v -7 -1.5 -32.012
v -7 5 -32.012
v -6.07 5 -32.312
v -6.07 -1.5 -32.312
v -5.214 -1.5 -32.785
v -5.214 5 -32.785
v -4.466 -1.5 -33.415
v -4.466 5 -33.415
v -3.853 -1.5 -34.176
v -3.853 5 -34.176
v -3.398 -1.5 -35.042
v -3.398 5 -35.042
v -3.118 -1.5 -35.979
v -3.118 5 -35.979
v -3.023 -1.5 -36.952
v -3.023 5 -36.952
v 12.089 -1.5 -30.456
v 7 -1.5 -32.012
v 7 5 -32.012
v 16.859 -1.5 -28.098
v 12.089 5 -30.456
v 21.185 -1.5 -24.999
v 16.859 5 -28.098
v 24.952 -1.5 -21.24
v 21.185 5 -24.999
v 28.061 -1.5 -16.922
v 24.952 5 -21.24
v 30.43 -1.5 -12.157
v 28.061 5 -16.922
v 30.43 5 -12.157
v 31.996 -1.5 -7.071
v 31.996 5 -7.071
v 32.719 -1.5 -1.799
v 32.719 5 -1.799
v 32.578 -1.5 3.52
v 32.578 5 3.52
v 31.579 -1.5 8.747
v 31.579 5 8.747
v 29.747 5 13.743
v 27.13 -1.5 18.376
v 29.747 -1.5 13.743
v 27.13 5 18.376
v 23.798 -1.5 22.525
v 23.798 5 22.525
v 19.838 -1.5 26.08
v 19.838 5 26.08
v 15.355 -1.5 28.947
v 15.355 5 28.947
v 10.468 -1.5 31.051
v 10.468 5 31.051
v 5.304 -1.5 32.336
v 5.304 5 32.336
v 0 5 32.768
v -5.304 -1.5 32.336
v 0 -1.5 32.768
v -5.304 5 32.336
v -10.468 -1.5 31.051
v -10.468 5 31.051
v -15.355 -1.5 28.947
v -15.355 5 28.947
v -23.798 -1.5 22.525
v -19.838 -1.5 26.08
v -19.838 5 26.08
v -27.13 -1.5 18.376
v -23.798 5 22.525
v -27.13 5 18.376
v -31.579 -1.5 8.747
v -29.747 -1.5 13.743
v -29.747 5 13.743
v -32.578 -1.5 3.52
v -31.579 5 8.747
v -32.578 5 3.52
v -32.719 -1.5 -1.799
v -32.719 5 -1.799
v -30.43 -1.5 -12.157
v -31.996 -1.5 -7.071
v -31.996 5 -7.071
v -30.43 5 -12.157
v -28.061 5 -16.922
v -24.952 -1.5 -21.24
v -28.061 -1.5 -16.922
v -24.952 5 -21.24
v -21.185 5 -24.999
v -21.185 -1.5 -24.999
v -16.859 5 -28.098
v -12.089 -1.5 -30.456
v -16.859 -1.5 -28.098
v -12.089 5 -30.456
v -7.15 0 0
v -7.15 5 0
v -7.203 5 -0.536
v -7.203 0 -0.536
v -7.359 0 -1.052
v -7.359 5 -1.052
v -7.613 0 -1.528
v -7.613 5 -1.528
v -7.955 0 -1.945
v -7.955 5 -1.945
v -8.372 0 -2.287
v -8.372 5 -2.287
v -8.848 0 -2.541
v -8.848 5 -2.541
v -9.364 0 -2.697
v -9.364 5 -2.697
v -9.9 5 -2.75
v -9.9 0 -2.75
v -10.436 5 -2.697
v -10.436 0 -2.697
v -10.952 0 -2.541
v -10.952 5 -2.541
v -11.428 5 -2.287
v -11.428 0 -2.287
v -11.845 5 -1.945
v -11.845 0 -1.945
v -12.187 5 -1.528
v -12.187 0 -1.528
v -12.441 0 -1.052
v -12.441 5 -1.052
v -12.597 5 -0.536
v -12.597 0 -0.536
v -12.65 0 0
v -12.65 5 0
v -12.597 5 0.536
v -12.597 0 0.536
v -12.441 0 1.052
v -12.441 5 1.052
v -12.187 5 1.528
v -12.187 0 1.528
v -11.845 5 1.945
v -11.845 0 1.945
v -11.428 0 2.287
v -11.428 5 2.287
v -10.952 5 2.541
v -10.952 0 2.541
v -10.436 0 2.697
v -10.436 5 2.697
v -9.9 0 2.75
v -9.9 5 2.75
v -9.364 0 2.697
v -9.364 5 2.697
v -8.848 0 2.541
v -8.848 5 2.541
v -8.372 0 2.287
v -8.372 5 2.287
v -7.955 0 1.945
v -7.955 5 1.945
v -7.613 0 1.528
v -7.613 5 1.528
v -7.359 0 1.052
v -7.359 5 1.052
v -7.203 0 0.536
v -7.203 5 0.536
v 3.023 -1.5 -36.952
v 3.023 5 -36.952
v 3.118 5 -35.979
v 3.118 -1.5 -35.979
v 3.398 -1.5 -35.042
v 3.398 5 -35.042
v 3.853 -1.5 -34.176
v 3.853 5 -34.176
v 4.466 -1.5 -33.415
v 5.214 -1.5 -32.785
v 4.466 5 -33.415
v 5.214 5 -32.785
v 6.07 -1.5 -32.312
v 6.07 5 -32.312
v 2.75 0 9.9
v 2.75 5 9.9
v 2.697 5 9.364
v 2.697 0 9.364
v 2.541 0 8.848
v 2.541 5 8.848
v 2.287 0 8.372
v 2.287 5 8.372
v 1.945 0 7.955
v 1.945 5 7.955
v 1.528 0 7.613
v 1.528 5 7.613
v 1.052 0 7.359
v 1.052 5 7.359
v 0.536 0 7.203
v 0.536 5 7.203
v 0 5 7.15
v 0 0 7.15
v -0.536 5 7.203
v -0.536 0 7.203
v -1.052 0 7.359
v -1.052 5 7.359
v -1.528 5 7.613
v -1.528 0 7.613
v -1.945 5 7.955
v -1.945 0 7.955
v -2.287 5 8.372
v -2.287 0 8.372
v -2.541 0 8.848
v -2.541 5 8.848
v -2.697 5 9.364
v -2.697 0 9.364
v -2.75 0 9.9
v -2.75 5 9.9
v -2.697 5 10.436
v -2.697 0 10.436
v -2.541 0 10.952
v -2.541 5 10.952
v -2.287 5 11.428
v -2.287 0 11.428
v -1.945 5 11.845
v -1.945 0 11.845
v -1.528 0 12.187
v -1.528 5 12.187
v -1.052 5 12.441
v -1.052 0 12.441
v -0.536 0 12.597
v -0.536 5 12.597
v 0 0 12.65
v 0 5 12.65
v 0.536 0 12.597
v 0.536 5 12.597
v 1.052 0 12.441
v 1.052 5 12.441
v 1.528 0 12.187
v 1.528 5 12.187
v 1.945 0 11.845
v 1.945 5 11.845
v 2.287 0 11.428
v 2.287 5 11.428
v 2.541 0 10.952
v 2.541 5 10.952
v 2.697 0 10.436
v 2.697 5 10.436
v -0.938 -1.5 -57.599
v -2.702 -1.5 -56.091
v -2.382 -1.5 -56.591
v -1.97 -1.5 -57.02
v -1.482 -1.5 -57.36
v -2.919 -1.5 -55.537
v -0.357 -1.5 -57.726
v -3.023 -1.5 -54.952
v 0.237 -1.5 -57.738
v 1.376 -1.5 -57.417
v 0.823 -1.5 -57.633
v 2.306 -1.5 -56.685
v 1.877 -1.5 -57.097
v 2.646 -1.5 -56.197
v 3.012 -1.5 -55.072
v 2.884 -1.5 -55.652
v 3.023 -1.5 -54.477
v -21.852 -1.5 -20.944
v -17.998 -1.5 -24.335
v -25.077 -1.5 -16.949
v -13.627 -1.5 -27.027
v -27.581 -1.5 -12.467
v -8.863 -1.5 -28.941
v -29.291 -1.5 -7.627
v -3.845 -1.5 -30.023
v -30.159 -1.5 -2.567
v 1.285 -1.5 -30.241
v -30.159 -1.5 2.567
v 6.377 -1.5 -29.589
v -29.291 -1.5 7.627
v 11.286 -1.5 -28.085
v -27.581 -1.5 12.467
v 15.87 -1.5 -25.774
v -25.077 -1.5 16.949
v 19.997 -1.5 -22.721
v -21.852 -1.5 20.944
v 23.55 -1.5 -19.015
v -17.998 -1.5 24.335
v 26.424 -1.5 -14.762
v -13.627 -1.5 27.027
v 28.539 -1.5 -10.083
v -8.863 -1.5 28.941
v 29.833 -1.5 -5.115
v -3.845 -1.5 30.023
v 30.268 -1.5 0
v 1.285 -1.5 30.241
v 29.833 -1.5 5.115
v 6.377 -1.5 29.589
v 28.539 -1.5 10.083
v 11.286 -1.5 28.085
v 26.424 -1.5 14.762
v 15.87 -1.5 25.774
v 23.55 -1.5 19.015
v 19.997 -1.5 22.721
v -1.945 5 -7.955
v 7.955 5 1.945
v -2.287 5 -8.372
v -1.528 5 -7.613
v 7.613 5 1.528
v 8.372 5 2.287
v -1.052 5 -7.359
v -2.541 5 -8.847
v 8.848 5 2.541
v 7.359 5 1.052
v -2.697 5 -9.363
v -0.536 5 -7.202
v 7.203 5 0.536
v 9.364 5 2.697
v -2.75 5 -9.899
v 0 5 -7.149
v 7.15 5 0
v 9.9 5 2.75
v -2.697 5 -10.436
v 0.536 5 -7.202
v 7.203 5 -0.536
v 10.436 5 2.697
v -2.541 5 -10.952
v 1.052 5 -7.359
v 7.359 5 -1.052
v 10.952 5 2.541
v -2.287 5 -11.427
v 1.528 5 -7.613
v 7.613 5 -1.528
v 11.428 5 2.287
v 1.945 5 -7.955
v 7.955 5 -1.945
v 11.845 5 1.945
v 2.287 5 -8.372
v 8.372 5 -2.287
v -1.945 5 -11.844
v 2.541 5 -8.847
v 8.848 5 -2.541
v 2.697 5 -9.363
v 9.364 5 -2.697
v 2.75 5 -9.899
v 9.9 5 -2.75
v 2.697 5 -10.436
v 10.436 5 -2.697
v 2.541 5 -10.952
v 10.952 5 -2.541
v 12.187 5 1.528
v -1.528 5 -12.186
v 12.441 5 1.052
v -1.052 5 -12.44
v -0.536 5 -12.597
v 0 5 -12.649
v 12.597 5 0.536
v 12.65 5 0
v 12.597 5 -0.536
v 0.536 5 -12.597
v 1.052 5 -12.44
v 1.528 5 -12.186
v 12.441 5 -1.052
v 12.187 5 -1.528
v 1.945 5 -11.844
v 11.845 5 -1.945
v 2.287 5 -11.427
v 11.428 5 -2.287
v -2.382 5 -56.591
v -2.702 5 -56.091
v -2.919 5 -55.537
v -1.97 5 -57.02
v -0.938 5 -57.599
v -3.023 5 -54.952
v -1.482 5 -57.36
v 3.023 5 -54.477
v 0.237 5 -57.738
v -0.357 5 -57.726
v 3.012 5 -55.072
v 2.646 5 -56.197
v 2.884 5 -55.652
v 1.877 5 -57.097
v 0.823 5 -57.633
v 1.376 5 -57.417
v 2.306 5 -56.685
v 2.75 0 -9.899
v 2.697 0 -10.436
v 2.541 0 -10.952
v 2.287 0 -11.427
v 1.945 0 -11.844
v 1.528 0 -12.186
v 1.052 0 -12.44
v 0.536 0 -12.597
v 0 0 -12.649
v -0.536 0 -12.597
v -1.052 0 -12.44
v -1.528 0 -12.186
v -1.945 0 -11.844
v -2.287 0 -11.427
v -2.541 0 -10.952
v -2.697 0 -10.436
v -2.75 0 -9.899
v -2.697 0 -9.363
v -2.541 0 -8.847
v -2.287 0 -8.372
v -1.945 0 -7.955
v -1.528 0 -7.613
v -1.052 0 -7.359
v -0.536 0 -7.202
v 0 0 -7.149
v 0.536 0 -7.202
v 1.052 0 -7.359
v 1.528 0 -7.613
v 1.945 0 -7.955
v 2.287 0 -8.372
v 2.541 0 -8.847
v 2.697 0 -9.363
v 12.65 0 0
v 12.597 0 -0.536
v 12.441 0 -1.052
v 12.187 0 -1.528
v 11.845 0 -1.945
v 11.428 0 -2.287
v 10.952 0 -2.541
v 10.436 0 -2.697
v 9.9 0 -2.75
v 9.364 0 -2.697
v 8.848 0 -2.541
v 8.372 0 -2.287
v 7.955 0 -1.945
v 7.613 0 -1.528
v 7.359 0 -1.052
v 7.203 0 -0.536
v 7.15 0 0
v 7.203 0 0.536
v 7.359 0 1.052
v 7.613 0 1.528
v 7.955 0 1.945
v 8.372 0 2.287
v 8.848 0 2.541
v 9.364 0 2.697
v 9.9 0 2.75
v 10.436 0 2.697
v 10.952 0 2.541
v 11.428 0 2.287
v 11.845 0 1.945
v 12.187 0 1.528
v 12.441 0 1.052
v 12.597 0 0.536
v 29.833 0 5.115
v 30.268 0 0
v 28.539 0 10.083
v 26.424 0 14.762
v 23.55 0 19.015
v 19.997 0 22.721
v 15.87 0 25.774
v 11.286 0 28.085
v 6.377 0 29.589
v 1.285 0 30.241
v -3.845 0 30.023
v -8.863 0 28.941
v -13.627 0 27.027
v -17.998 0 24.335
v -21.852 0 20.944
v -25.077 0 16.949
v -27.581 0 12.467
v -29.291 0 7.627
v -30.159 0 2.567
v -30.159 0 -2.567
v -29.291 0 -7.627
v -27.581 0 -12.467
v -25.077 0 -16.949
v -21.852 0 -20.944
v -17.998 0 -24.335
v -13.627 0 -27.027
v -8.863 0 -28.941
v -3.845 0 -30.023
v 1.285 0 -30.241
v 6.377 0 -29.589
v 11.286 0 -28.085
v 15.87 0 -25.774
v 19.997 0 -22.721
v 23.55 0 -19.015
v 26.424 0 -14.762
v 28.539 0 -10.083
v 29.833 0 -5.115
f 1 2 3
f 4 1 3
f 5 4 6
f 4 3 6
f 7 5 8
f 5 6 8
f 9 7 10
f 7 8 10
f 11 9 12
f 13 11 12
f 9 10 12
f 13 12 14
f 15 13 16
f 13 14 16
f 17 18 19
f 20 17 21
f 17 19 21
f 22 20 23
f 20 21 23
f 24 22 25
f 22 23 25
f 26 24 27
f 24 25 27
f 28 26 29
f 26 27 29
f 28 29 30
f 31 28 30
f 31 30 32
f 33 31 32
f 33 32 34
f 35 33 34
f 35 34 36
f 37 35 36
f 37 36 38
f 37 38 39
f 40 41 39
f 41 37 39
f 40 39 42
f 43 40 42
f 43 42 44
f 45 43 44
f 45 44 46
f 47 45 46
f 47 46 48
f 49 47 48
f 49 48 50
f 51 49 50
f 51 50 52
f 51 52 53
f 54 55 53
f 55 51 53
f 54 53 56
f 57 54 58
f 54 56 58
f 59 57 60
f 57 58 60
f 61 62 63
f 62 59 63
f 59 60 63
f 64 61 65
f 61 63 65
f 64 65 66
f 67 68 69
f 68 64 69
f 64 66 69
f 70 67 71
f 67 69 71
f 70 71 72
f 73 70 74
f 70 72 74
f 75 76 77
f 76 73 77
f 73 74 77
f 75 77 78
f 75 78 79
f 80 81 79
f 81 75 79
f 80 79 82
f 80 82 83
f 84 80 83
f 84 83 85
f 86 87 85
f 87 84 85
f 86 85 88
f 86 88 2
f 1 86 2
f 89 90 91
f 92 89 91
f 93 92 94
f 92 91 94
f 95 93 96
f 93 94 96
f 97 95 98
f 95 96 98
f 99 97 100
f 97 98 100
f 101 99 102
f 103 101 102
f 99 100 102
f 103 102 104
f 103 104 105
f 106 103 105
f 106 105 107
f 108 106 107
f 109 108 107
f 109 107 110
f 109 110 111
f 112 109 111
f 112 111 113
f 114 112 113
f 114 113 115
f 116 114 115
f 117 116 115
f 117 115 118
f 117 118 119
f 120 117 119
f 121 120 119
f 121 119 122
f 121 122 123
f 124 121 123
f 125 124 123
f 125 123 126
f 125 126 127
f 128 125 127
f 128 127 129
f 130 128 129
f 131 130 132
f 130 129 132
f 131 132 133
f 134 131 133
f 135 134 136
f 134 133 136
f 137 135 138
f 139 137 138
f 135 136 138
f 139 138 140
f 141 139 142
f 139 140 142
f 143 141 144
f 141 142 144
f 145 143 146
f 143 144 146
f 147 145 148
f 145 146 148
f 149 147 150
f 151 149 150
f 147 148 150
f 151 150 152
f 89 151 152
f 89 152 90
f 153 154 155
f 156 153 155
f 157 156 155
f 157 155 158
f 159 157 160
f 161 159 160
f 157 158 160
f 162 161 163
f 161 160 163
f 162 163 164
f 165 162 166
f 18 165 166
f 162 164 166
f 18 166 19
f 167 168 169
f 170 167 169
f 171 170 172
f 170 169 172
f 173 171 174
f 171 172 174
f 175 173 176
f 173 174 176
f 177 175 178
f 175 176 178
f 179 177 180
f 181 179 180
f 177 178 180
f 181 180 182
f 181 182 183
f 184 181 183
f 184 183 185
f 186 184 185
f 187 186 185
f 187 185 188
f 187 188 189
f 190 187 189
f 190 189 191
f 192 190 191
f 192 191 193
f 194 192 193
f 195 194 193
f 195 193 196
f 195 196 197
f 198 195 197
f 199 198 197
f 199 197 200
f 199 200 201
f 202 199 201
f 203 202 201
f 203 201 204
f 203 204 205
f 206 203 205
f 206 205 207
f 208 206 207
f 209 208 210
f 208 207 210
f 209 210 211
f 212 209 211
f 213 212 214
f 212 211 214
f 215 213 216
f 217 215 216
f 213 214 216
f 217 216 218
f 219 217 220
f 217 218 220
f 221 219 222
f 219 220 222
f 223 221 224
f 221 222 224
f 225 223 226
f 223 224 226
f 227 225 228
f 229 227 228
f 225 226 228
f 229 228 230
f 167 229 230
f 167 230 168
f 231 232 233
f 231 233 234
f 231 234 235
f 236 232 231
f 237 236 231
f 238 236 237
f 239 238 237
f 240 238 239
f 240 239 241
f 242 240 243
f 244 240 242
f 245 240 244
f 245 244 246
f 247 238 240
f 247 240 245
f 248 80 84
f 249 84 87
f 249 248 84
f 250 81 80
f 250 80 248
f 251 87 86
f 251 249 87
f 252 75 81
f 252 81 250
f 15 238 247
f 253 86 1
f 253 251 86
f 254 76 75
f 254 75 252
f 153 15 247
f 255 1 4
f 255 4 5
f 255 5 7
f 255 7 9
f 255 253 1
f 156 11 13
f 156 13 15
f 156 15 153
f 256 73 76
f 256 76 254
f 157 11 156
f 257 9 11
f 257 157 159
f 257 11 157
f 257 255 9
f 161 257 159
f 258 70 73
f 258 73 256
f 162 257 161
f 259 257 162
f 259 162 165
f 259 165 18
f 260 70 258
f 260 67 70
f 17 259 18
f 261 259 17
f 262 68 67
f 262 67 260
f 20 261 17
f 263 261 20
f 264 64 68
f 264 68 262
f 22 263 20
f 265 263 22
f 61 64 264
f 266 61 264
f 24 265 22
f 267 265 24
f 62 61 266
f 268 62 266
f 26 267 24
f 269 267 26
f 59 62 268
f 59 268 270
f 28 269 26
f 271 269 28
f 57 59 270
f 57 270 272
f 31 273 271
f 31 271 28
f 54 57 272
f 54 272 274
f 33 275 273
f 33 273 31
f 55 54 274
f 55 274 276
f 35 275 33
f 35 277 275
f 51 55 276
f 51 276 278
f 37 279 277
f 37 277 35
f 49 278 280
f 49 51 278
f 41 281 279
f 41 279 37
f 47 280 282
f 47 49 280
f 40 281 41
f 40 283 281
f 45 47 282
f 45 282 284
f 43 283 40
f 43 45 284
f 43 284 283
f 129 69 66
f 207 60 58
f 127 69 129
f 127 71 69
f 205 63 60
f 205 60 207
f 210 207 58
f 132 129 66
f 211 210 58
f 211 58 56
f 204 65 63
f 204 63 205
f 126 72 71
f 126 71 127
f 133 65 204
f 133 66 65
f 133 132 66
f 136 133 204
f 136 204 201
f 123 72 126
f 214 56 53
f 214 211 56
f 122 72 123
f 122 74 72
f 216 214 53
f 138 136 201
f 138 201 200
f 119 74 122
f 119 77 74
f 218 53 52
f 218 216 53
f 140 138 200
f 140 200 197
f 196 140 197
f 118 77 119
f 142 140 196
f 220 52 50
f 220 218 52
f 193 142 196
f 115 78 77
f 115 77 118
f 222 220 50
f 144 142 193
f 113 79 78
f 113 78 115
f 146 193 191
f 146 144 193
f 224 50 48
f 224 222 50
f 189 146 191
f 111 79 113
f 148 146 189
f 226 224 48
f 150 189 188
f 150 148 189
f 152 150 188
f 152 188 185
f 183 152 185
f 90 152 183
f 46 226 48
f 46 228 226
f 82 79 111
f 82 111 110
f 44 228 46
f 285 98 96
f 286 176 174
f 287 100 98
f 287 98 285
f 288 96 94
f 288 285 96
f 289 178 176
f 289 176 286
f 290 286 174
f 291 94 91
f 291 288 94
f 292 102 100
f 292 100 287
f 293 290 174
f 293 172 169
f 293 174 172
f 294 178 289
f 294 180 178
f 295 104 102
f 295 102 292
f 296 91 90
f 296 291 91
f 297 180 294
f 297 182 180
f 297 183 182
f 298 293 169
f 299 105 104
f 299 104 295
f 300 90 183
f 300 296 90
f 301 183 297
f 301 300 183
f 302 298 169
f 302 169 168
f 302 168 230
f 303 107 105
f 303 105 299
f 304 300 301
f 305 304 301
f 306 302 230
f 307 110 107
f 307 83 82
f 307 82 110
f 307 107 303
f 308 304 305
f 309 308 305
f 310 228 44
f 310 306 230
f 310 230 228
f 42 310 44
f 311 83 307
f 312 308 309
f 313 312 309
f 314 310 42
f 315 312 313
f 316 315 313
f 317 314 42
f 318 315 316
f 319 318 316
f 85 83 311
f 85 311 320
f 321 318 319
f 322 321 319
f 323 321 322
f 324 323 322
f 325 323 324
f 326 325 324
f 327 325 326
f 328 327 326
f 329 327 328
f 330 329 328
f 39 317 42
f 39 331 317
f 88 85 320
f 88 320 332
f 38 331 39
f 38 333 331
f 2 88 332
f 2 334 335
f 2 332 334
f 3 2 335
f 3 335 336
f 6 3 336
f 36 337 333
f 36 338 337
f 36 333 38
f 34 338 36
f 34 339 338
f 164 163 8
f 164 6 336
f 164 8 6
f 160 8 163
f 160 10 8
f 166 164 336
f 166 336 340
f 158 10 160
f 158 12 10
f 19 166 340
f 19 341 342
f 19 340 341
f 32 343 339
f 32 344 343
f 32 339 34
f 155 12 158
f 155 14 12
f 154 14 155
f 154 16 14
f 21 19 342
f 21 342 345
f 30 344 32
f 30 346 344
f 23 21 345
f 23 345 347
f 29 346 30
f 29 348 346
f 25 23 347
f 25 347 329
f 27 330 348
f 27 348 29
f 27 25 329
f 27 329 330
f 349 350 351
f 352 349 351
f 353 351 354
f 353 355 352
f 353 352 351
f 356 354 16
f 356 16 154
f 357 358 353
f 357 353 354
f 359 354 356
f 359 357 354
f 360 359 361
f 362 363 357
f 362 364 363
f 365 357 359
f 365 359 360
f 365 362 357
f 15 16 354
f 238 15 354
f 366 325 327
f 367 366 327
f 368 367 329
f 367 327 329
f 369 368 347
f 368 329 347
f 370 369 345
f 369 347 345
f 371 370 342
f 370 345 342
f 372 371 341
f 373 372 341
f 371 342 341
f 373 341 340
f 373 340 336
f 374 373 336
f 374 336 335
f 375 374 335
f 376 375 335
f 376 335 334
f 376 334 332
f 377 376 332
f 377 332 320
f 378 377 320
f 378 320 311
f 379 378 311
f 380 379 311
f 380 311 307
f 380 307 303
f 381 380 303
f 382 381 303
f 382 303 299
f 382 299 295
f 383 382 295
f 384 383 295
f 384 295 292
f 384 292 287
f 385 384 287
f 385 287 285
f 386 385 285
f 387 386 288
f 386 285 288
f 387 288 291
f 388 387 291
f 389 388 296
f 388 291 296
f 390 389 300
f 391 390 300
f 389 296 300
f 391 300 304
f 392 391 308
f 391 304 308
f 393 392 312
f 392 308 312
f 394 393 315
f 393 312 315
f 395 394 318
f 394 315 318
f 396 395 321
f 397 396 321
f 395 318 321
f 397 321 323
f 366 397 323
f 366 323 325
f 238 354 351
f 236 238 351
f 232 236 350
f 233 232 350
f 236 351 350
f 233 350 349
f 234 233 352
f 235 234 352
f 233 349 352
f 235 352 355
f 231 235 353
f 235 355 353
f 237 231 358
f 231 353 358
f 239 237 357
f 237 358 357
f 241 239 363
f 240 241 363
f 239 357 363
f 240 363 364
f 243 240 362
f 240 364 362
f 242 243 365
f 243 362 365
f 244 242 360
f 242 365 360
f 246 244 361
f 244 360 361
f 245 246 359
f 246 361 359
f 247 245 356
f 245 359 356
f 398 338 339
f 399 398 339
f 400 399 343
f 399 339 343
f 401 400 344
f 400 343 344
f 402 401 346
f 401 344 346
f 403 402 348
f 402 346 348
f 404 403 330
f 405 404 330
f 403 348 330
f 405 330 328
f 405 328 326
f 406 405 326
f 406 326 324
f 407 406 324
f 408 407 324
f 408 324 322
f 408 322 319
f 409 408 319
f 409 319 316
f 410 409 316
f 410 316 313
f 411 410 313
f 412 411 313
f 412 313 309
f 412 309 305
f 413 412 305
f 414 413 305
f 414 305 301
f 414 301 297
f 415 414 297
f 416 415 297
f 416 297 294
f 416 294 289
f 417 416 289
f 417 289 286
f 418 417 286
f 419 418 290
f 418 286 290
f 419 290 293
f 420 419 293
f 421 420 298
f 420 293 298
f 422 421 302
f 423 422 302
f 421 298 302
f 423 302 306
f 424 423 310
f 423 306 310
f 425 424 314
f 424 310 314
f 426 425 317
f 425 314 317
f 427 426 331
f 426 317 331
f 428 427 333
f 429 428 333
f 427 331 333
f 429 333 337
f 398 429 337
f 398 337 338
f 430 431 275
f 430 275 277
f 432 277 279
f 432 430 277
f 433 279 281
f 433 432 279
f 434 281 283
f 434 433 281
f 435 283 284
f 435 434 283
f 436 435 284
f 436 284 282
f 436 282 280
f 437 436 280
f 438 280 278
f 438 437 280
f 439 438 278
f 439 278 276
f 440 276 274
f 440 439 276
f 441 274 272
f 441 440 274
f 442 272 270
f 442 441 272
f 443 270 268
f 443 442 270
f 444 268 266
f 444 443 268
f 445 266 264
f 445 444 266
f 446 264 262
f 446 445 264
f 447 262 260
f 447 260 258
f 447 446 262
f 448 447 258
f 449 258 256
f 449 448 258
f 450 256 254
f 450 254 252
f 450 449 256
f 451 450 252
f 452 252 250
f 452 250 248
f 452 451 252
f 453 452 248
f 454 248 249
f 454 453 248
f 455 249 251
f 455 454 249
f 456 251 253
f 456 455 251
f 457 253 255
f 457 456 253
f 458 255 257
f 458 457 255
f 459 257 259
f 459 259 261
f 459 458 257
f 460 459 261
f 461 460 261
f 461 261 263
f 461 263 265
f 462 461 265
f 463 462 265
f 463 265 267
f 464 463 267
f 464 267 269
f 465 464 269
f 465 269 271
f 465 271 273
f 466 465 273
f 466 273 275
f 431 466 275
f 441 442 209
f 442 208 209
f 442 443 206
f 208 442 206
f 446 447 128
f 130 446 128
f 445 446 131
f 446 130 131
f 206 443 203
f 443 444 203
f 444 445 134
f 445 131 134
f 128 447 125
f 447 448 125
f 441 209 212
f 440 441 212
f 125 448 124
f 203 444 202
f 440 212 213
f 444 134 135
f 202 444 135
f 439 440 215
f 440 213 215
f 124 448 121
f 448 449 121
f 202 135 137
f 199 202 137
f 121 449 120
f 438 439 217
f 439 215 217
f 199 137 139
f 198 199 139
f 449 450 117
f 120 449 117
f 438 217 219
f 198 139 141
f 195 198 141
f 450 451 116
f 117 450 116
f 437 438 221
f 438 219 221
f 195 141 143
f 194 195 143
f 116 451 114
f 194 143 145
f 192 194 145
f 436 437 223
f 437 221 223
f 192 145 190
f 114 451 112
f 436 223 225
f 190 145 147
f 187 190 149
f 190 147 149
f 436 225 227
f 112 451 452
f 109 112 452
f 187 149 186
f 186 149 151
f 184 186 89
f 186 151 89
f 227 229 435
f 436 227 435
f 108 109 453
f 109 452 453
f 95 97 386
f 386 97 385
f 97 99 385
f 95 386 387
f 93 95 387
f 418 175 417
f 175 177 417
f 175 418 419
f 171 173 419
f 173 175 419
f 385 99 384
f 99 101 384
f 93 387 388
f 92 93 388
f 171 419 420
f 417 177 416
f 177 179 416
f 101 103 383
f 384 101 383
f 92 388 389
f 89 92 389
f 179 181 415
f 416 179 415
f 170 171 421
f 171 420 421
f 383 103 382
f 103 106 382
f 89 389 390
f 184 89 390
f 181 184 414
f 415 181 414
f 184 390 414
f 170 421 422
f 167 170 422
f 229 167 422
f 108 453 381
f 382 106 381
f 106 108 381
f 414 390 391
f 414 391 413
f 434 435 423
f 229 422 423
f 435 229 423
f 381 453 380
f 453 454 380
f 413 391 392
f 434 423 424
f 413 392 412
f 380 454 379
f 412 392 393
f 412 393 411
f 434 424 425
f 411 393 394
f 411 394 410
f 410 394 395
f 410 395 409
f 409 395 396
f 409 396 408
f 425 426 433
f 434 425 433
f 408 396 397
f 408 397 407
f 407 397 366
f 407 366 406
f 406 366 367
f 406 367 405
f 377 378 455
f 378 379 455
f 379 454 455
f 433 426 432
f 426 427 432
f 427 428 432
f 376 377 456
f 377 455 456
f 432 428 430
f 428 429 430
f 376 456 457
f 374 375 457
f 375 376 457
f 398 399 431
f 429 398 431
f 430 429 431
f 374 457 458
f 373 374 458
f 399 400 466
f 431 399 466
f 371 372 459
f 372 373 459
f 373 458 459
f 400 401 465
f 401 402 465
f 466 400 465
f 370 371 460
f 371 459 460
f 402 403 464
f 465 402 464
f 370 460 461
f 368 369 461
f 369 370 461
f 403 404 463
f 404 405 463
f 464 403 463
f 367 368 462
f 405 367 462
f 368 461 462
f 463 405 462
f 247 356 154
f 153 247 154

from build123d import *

# Parameters (mm, degrees)
SKETCH2_R           = 32.76798012
BOSS_EXTRUDE1_DEPTH = 5
SKETCH3_R           = 32.76798012
SKETCH3_R_2         = 30.26798012
BOSS_EXTRUDE2_DEPTH = 1.5
SKETCH4_R           = 2.75
CUT_EXTRUDE1_DEPTH  = 9.8994949
BOSS_EXTRUDE3_DEPTH = 6.5


with BuildPart() as part:
    # Sketch2 → Boss-Extrude1 (new body)
    with BuildSketch(Plane(origin=(0, 0, 0), x_dir=(1, 0, 0), z_dir=(0, 1, 0))):
        Circle(SKETCH2_R)
    extrude(amount=BOSS_EXTRUDE1_DEPTH)

    # Sketch3 → Boss-Extrude2 (add)
    with BuildSketch(Plane.XZ):
        Circle(SKETCH3_R)
        Circle(SKETCH3_R_2, mode=Mode.SUBTRACT)
    extrude(amount=BOSS_EXTRUDE2_DEPTH)

    # Sketch4 → Cut-Extrude1 (cut)
    with BuildSketch(Plane(origin=(0, 5, 0), x_dir=(1, 0, 0), z_dir=(0, 1, 0))):
        with Locations((0, 9.8994949)):
            Circle(SKETCH4_R)
        with Locations((-9.9, 0)):
            Circle(SKETCH4_R)
        with Locations((9.9, 0)):
            Circle(SKETCH4_R)
        with Locations((0, -9.9)):
            Circle(SKETCH4_R)
    extrude(amount=-CUT_EXTRUDE1_DEPTH, mode=Mode.SUBTRACT)

    # Sketch5 → Boss-Extrude3 (add)
    with BuildSketch(Plane(origin=(0, 5, 0), x_dir=(1, 0, 0), z_dir=(0, 1, 0))):
        with BuildLine():
            Line((-3.023415672, 36.951680319), (-3.023415672, 54.951680319))
            ThreePointArc((-3.023415672, 54.951680319), (0.237235199, 57.737860793), (3.023415672, 54.477209922))
            Line((3.023415672, 54.477209922), (3.023415672, 36.951680319))
            ThreePointArc((3.023415672, 36.951680319), (4.141073493, 33.780800032), (7, 32.011568552))
            ThreePointArc((7, 32.011568552), (0, 32.76798012), (-7, 32.011568552))
            ThreePointArc((-7, 32.011568552), (-4.141073493, 33.780800032), (-3.023415672, 36.951680319))
        make_face()
    extrude(amount=-BOSS_EXTRUDE3_DEPTH)


solid = part.part
